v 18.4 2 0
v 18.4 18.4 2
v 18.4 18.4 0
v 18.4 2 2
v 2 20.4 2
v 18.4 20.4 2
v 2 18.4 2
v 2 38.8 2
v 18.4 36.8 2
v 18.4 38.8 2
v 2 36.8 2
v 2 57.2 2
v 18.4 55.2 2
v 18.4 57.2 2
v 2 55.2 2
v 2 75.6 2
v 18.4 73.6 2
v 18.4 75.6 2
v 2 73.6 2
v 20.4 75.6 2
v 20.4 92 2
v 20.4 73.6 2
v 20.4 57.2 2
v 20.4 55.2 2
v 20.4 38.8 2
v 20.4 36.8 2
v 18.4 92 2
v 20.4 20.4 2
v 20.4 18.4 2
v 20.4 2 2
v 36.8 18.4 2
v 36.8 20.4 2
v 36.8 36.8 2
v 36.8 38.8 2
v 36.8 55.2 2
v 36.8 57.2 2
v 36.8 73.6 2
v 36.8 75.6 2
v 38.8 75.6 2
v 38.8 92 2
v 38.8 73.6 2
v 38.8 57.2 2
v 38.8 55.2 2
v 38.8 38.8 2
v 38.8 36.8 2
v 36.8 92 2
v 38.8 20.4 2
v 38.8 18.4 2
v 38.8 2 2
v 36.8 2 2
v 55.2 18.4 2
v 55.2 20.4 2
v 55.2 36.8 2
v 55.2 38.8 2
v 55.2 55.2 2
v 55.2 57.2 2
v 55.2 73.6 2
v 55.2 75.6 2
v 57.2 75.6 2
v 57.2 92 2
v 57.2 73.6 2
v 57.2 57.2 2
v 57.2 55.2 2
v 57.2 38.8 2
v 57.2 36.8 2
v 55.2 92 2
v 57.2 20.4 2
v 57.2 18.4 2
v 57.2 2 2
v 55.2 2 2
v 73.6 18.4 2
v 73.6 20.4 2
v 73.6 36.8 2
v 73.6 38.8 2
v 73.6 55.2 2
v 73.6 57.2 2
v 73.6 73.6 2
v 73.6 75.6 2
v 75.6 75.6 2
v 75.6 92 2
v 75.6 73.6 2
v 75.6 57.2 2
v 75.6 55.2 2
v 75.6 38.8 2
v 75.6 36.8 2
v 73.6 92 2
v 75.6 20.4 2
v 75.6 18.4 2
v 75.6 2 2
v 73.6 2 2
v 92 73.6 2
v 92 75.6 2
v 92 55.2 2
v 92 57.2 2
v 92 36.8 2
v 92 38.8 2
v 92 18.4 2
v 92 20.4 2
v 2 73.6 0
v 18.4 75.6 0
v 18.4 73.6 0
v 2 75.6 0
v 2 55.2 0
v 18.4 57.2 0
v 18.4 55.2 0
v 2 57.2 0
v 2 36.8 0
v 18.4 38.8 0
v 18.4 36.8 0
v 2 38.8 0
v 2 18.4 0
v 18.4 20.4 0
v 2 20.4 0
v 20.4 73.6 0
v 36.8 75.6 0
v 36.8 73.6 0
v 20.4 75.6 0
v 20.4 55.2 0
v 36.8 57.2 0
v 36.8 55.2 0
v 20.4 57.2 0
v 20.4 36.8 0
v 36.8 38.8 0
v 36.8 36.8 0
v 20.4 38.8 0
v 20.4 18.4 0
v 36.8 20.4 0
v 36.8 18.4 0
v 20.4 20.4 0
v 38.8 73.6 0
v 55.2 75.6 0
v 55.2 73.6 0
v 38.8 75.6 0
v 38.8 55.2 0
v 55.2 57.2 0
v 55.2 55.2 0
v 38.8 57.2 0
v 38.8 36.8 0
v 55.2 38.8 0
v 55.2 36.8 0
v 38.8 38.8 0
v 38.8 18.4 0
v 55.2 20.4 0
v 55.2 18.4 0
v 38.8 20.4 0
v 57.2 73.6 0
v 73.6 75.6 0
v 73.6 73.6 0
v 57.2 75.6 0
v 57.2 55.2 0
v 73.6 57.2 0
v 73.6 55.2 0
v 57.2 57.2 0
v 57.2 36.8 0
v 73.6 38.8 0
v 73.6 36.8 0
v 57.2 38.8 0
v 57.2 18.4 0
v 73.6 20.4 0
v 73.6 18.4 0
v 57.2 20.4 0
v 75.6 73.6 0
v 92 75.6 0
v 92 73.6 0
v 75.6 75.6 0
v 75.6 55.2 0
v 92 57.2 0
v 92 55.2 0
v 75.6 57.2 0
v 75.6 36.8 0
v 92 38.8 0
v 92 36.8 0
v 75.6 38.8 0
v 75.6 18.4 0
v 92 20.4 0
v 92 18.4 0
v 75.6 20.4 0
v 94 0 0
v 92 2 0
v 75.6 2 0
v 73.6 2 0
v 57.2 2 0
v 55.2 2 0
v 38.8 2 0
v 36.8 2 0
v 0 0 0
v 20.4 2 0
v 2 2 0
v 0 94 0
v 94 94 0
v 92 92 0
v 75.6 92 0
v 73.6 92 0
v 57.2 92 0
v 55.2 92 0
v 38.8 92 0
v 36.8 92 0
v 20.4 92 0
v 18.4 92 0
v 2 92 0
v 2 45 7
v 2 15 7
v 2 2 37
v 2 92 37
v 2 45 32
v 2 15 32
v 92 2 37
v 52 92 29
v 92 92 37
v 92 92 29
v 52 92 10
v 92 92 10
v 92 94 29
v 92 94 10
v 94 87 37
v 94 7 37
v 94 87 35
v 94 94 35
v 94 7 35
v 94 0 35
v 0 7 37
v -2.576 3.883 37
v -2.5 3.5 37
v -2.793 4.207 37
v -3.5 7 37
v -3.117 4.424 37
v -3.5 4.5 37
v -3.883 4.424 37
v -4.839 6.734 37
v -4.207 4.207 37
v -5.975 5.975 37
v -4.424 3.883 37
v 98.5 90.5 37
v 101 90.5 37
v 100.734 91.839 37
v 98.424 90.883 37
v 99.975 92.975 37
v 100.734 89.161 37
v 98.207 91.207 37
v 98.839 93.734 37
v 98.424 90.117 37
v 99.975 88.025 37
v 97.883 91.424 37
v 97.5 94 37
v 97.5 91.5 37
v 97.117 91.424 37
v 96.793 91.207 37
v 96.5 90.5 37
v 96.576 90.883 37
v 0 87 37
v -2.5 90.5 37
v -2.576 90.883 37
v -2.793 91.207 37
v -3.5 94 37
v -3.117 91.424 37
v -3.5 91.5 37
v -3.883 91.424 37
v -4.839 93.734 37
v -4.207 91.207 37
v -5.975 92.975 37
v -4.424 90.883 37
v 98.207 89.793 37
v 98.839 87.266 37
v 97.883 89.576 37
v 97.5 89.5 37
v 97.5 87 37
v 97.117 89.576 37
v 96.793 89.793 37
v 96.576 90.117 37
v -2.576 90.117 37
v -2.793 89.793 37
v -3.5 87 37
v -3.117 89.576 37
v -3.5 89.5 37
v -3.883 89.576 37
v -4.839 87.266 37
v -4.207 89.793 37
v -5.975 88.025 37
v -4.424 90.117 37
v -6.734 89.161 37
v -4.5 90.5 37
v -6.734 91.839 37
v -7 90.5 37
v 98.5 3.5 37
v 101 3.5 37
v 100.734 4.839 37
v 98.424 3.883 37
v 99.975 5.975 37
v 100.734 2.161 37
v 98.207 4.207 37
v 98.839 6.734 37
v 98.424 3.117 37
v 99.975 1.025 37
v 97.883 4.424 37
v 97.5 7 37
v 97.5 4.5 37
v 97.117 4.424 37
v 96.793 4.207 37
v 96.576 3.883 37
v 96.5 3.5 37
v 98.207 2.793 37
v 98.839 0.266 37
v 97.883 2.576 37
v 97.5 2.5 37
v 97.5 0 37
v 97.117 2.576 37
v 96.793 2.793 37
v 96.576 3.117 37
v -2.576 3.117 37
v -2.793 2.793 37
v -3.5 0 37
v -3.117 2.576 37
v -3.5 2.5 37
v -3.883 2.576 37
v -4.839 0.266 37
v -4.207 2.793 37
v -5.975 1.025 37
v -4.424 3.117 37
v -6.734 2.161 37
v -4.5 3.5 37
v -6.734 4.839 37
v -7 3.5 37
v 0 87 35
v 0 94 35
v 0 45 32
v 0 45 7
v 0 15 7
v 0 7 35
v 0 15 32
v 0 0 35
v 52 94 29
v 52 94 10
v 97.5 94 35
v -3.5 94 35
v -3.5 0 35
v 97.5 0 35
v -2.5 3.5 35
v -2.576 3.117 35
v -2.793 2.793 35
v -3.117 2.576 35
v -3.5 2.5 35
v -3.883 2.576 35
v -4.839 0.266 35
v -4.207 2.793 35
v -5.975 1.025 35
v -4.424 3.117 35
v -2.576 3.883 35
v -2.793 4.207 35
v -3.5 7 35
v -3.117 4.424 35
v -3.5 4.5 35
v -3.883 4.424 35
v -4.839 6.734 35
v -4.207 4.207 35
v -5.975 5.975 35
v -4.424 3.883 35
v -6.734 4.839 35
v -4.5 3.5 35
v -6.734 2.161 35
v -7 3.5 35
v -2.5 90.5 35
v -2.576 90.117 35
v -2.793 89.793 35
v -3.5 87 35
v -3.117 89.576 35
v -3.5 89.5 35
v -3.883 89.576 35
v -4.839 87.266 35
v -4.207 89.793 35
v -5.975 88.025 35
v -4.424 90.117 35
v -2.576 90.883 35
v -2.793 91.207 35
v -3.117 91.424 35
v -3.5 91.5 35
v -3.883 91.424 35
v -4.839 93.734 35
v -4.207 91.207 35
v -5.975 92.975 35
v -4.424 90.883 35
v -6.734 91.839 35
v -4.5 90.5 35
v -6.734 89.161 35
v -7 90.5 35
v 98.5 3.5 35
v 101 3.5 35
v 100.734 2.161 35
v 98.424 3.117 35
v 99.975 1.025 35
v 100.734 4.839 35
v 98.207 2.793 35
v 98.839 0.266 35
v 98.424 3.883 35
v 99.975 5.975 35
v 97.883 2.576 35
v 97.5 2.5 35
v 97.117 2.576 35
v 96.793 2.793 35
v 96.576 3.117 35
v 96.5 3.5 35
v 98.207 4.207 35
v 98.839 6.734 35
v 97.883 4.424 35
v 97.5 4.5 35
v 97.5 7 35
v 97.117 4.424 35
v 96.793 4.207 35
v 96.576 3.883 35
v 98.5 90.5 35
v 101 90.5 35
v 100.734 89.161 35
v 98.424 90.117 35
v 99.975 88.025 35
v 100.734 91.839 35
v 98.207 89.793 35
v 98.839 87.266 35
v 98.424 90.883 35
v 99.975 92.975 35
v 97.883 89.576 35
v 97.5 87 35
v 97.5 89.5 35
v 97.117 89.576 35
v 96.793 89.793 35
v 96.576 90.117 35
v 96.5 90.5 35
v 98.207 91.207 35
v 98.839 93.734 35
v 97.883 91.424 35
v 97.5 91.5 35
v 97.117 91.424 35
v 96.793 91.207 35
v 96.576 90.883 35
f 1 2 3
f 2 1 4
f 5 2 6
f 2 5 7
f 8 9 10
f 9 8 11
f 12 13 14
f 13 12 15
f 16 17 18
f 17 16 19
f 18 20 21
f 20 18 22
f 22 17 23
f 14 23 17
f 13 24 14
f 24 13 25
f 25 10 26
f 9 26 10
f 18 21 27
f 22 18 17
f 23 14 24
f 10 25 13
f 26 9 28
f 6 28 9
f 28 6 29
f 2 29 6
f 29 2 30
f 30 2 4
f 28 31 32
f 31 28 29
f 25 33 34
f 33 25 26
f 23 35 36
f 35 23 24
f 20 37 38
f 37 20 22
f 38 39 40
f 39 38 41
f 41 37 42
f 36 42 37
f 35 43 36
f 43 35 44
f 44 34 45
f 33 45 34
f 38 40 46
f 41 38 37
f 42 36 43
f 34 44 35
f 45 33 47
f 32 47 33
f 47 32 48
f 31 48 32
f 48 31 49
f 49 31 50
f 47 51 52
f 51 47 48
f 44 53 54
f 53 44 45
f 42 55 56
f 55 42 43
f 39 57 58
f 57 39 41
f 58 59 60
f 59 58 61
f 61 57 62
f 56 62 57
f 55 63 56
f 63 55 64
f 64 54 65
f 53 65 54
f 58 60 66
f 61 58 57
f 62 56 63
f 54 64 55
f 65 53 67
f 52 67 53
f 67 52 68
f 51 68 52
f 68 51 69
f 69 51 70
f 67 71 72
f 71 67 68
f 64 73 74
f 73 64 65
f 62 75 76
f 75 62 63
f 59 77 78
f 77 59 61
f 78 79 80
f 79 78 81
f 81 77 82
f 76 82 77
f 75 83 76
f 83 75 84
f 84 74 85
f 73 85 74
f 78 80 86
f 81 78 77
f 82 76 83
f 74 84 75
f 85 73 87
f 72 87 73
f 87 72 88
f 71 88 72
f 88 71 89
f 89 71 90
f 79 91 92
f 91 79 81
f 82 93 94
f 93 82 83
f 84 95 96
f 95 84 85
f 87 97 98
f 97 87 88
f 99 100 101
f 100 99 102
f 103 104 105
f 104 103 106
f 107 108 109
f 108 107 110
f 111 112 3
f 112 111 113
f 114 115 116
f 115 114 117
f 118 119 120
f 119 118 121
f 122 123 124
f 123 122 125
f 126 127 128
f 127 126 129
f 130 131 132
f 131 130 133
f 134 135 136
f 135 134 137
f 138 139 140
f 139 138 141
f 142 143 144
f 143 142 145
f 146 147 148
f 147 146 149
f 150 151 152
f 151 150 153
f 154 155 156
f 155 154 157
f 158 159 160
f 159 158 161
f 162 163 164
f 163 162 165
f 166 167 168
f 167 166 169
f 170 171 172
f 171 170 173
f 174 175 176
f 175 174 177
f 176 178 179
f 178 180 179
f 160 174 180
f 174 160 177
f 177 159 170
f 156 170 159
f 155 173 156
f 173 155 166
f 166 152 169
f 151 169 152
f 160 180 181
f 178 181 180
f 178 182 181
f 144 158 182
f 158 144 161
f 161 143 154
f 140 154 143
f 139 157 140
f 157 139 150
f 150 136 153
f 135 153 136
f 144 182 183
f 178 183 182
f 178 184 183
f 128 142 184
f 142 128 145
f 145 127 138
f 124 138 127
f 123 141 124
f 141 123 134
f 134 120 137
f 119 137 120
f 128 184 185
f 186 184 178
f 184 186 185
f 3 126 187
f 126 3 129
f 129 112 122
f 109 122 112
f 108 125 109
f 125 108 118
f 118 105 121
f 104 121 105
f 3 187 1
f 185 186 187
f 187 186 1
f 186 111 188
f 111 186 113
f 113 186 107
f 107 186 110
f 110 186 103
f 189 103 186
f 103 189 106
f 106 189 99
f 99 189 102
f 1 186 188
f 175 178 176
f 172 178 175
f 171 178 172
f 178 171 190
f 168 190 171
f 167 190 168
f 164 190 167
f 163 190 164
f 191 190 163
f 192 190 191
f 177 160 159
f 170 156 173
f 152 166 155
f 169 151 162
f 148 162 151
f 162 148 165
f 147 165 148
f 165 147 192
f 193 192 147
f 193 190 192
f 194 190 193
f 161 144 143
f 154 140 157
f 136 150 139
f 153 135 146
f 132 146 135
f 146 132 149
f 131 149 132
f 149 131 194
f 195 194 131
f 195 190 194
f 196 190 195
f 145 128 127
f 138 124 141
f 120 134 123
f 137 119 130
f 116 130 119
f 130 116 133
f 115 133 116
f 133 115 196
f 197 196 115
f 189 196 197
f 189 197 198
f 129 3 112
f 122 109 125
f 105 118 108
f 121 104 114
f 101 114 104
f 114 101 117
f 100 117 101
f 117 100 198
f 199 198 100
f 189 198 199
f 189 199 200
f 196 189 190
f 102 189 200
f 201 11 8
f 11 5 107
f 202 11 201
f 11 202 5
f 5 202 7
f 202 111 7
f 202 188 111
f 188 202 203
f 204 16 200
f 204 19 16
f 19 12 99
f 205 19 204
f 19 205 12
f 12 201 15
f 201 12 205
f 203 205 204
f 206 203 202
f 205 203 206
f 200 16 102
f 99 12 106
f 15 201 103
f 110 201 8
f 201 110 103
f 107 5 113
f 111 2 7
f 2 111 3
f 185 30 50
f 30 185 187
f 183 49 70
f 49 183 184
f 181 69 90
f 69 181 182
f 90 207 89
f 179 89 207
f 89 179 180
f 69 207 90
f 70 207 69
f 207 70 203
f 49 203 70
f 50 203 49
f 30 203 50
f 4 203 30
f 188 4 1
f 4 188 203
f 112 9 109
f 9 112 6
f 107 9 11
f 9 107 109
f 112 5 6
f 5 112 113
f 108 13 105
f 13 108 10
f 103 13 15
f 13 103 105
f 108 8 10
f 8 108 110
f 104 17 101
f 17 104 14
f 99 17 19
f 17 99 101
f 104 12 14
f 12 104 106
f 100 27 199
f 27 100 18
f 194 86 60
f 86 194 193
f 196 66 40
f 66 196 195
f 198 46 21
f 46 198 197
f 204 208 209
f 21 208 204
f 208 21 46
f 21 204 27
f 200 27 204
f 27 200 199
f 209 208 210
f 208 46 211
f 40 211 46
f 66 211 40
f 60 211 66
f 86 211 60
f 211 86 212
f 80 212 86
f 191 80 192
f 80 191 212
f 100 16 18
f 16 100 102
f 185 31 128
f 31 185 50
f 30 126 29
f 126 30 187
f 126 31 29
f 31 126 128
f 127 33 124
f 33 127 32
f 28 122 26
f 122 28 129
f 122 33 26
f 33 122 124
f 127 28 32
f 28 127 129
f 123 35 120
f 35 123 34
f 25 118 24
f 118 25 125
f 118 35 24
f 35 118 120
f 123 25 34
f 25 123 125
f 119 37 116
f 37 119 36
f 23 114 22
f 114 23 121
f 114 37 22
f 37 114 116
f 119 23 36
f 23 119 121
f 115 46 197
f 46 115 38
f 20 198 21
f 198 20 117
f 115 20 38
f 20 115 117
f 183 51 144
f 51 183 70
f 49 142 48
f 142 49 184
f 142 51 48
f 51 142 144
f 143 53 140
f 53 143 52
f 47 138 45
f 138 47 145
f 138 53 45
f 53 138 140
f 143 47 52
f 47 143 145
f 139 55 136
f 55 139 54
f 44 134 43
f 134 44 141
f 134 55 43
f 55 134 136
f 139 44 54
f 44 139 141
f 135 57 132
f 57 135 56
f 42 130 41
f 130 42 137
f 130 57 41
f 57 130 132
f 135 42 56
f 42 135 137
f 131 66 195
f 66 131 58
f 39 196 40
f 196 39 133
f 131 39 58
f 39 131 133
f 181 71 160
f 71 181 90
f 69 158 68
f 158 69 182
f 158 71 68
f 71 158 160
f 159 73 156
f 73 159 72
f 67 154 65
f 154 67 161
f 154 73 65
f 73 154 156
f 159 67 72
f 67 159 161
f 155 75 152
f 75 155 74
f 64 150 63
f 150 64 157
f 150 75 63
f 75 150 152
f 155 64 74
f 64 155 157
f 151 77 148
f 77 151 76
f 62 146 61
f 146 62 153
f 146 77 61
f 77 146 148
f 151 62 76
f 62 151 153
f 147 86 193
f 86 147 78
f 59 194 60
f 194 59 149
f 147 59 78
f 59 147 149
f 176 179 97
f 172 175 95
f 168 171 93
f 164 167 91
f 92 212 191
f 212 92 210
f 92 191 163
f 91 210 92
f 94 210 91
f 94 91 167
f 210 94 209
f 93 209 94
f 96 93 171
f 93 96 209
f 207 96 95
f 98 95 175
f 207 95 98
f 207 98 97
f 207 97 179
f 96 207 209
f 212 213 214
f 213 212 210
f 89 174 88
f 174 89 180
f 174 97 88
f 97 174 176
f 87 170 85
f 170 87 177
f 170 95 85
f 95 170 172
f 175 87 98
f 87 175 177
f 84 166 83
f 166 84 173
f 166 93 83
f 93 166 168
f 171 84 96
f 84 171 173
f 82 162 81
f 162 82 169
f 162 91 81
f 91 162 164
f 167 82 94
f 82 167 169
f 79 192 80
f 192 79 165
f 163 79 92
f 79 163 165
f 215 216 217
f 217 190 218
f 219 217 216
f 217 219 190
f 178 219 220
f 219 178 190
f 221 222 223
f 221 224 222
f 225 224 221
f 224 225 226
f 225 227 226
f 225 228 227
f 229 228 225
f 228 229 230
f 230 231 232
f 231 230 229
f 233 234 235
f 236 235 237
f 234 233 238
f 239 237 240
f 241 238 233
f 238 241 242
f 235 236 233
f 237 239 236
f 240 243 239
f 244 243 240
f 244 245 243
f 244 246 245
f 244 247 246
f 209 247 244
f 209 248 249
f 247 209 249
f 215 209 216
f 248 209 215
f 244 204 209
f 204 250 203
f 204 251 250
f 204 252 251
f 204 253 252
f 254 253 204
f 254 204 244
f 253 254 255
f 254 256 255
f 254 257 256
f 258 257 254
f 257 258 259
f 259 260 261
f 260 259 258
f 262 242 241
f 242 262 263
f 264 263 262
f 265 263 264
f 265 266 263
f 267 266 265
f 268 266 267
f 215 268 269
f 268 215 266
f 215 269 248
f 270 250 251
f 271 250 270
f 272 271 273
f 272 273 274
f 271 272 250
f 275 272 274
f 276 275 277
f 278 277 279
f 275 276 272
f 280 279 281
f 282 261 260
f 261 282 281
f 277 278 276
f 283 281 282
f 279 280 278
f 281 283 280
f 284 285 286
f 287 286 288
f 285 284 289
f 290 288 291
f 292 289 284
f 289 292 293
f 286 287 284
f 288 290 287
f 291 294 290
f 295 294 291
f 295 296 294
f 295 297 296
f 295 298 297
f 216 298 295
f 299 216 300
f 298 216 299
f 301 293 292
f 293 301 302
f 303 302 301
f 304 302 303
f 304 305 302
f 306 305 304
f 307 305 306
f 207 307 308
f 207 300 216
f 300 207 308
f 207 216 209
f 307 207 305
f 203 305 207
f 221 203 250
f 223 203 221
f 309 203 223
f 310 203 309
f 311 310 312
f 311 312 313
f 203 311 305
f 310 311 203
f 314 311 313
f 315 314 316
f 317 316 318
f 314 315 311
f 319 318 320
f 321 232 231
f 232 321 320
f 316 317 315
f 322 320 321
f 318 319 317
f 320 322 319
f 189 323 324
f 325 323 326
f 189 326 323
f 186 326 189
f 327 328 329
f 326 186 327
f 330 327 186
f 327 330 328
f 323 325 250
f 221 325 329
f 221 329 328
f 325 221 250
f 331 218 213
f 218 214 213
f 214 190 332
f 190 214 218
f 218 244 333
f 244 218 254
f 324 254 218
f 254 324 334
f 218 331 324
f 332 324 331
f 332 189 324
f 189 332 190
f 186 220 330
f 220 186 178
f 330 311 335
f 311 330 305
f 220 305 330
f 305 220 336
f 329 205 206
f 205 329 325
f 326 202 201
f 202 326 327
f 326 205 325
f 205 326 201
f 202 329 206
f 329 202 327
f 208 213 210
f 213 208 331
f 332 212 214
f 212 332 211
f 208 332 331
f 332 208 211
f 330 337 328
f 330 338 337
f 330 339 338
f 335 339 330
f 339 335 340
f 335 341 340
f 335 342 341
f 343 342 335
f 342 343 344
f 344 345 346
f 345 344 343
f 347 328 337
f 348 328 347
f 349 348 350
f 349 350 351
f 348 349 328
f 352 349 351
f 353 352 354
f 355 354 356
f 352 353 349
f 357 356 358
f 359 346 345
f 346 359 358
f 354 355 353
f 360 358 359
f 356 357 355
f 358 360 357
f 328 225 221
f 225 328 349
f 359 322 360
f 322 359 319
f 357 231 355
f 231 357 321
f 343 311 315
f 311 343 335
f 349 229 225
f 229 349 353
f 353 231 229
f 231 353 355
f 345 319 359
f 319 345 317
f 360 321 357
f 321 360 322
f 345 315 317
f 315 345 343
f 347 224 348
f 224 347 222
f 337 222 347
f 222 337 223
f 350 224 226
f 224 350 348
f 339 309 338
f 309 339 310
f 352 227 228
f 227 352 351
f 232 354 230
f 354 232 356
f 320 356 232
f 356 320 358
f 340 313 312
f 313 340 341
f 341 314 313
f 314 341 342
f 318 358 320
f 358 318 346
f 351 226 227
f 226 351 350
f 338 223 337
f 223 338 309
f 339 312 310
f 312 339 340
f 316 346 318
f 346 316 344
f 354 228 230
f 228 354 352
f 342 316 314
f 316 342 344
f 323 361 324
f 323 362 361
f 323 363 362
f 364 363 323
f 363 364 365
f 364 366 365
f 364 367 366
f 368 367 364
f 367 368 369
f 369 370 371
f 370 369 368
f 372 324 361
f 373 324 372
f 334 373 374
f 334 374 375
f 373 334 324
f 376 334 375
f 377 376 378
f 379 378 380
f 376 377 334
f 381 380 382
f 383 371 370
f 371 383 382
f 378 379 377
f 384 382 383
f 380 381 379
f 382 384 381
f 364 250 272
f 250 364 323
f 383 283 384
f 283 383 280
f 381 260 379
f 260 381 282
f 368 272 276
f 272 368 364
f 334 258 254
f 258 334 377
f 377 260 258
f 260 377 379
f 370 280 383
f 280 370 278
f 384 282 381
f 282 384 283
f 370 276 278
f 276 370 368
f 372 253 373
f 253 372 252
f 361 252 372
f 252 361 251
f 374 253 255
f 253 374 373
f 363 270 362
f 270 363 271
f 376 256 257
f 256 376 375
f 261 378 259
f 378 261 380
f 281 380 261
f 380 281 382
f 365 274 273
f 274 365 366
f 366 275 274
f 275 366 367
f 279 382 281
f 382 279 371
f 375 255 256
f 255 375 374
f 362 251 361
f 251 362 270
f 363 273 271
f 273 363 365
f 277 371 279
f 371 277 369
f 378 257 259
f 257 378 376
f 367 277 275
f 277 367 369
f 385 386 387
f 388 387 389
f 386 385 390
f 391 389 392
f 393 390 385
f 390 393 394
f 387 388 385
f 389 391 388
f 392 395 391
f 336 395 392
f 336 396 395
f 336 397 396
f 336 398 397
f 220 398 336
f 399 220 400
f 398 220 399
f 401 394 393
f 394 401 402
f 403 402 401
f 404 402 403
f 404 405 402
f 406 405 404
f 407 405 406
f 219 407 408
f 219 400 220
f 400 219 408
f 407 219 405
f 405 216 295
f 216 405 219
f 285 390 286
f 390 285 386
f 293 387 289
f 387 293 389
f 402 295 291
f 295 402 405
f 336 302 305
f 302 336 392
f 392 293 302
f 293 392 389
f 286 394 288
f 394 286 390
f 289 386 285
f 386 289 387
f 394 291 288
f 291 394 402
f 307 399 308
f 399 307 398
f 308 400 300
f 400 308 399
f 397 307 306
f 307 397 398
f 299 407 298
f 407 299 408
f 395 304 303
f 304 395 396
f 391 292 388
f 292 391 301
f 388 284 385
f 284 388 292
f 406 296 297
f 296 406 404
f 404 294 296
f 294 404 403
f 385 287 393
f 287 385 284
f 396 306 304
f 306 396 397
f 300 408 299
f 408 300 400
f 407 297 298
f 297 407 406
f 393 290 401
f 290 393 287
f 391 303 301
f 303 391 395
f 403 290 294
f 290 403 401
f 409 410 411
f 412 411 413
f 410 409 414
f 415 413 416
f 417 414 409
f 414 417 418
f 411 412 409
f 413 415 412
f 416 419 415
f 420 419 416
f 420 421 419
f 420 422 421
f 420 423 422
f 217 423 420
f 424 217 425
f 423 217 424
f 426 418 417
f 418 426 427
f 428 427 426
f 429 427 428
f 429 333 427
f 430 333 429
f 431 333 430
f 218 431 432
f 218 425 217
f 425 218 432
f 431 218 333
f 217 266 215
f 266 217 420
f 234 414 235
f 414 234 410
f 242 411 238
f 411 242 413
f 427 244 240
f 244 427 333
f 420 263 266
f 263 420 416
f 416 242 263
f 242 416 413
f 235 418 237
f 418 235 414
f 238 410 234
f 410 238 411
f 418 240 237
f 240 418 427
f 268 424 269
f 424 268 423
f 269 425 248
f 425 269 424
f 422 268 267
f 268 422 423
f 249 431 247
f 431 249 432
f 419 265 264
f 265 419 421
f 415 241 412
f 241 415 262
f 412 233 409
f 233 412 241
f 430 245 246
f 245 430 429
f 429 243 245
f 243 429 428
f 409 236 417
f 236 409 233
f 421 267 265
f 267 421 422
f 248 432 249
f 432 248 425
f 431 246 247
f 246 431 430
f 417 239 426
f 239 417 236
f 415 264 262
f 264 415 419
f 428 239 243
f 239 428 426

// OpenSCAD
materialDicke = 2;
hoehe = 35;
breite = 90;
tiefe = 90;
kaltGeraeteSteckerBreite = 30;
kaltGeraeteSteckerhoehe = 25;
kaltGeraeteSteckerAbstandVonGitter = 5;
kaltGeraeteSteckerAbstandVonVordererWand = 15;
kabelAbstandVonGitter=8;
kabelHoehe=hoehe-2*8;
kabelBreite = 40;
kabelAbstandVonLinkerWand=50;
gitterRechteckBreite = (breite-materialDicke*4)/5;
gitterRechteckTiefe = (tiefe-materialDicke*4)/5;
schraubeDurchmesser=2;
schraubeKopfDurchmesser=5;
schraubeToleranz=2;
fn=16;
difference(){
  cube([breite+materialDicke*2, tiefe+materialDicke*2, hoehe+materialDicke]);
  translate([materialDicke,materialDicke,materialDicke])cube([breite, tiefe, hoehe]);
  
  //Gitter
  for(x = [materialDicke:gitterRechteckBreite+materialDicke:breite+materialDicke-gitterRechteckBreite]){
    for(y = [materialDicke:gitterRechteckBreite+materialDicke:breite+materialDicke-gitterRechteckBreite]){
        translate([x,y,0])cube([gitterRechteckBreite,gitterRechteckTiefe,materialDicke]);
    }
  }
  
  //Aussparung KaltgeraeteStecker
  translate([0,kaltGeraeteSteckerAbstandVonVordererWand,materialDicke+kaltGeraeteSteckerAbstandVonGitter])cube([materialDicke,kaltGeraeteSteckerBreite,kaltGeraeteSteckerhoehe]);
  
  //Aussparung Kabel
  translate([kabelAbstandVonLinkerWand+materialDicke,tiefe+materialDicke, kabelAbstandVonGitter+materialDicke])cube([kabelBreite,materialDicke,kabelHoehe]);
}

//SchraubLoecher
translate([-(schraubeKopfDurchmesser+schraubeToleranz)/2,0,hoehe]){
  difference(){
    union(){
      cube([(schraubeKopfDurchmesser+schraubeToleranz)/2,schraubeKopfDurchmesser+schraubeToleranz,materialDicke]);
      translate([0,(schraubeKopfDurchmesser+schraubeToleranz)/2,0])cylinder($fn=fn, d=schraubeKopfDurchmesser+schraubeToleranz, h=materialDicke);
    }
    translate([0,(schraubeKopfDurchmesser+schraubeToleranz)/2,0])cylinder($fn=fn, d=schraubeDurchmesser,h=materialDicke);
  }
}

translate([-(schraubeKopfDurchmesser+schraubeToleranz)/2,tiefe+materialDicke*2-((schraubeKopfDurchmesser+schraubeToleranz)),hoehe]){
  difference(){
    union(){
      cube([(schraubeKopfDurchmesser+schraubeToleranz)/2,schraubeKopfDurchmesser+schraubeToleranz,materialDicke]);
      translate([0,(schraubeKopfDurchmesser+schraubeToleranz)/2,0])cylinder($fn=fn, d=schraubeKopfDurchmesser+schraubeToleranz, h=materialDicke);
    }
    translate([0,(schraubeKopfDurchmesser+schraubeToleranz)/2,0])cylinder($fn=fn, d=schraubeDurchmesser,h=materialDicke);
  }
}

translate([breite+materialDicke*2+(schraubeKopfDurchmesser+schraubeToleranz)/2,schraubeKopfDurchmesser+schraubeToleranz,hoehe]){
  rotate([0,0,180])difference(){
    union(){
      cube([(schraubeKopfDurchmesser+schraubeToleranz)/2,schraubeKopfDurchmesser+schraubeToleranz,materialDicke]);
      translate([0,(schraubeKopfDurchmesser+schraubeToleranz)/2,0])cylinder($fn=fn, d=schraubeKopfDurchmesser+schraubeToleranz, h=materialDicke);
    }
    translate([0,(schraubeKopfDurchmesser+schraubeToleranz)/2,0])cylinder($fn=fn, d=schraubeDurchmesser,h=materialDicke);
  }
}

translate([breite+materialDicke*2+(schraubeKopfDurchmesser+schraubeToleranz)/2,tiefe+materialDicke*2,hoehe]){
  rotate([0,0,180])difference(){
    union(){
      cube([(schraubeKopfDurchmesser+schraubeToleranz)/2,schraubeKopfDurchmesser+schraubeToleranz,materialDicke]);
      translate([0,(schraubeKopfDurchmesser+schraubeToleranz)/2,0])cylinder($fn=fn, d=schraubeKopfDurchmesser+schraubeToleranz, h=materialDicke);
    }
    translate([0,(schraubeKopfDurchmesser+schraubeToleranz)/2,0])cylinder($fn=fn, d=schraubeDurchmesser,h=materialDicke);
  }
}
